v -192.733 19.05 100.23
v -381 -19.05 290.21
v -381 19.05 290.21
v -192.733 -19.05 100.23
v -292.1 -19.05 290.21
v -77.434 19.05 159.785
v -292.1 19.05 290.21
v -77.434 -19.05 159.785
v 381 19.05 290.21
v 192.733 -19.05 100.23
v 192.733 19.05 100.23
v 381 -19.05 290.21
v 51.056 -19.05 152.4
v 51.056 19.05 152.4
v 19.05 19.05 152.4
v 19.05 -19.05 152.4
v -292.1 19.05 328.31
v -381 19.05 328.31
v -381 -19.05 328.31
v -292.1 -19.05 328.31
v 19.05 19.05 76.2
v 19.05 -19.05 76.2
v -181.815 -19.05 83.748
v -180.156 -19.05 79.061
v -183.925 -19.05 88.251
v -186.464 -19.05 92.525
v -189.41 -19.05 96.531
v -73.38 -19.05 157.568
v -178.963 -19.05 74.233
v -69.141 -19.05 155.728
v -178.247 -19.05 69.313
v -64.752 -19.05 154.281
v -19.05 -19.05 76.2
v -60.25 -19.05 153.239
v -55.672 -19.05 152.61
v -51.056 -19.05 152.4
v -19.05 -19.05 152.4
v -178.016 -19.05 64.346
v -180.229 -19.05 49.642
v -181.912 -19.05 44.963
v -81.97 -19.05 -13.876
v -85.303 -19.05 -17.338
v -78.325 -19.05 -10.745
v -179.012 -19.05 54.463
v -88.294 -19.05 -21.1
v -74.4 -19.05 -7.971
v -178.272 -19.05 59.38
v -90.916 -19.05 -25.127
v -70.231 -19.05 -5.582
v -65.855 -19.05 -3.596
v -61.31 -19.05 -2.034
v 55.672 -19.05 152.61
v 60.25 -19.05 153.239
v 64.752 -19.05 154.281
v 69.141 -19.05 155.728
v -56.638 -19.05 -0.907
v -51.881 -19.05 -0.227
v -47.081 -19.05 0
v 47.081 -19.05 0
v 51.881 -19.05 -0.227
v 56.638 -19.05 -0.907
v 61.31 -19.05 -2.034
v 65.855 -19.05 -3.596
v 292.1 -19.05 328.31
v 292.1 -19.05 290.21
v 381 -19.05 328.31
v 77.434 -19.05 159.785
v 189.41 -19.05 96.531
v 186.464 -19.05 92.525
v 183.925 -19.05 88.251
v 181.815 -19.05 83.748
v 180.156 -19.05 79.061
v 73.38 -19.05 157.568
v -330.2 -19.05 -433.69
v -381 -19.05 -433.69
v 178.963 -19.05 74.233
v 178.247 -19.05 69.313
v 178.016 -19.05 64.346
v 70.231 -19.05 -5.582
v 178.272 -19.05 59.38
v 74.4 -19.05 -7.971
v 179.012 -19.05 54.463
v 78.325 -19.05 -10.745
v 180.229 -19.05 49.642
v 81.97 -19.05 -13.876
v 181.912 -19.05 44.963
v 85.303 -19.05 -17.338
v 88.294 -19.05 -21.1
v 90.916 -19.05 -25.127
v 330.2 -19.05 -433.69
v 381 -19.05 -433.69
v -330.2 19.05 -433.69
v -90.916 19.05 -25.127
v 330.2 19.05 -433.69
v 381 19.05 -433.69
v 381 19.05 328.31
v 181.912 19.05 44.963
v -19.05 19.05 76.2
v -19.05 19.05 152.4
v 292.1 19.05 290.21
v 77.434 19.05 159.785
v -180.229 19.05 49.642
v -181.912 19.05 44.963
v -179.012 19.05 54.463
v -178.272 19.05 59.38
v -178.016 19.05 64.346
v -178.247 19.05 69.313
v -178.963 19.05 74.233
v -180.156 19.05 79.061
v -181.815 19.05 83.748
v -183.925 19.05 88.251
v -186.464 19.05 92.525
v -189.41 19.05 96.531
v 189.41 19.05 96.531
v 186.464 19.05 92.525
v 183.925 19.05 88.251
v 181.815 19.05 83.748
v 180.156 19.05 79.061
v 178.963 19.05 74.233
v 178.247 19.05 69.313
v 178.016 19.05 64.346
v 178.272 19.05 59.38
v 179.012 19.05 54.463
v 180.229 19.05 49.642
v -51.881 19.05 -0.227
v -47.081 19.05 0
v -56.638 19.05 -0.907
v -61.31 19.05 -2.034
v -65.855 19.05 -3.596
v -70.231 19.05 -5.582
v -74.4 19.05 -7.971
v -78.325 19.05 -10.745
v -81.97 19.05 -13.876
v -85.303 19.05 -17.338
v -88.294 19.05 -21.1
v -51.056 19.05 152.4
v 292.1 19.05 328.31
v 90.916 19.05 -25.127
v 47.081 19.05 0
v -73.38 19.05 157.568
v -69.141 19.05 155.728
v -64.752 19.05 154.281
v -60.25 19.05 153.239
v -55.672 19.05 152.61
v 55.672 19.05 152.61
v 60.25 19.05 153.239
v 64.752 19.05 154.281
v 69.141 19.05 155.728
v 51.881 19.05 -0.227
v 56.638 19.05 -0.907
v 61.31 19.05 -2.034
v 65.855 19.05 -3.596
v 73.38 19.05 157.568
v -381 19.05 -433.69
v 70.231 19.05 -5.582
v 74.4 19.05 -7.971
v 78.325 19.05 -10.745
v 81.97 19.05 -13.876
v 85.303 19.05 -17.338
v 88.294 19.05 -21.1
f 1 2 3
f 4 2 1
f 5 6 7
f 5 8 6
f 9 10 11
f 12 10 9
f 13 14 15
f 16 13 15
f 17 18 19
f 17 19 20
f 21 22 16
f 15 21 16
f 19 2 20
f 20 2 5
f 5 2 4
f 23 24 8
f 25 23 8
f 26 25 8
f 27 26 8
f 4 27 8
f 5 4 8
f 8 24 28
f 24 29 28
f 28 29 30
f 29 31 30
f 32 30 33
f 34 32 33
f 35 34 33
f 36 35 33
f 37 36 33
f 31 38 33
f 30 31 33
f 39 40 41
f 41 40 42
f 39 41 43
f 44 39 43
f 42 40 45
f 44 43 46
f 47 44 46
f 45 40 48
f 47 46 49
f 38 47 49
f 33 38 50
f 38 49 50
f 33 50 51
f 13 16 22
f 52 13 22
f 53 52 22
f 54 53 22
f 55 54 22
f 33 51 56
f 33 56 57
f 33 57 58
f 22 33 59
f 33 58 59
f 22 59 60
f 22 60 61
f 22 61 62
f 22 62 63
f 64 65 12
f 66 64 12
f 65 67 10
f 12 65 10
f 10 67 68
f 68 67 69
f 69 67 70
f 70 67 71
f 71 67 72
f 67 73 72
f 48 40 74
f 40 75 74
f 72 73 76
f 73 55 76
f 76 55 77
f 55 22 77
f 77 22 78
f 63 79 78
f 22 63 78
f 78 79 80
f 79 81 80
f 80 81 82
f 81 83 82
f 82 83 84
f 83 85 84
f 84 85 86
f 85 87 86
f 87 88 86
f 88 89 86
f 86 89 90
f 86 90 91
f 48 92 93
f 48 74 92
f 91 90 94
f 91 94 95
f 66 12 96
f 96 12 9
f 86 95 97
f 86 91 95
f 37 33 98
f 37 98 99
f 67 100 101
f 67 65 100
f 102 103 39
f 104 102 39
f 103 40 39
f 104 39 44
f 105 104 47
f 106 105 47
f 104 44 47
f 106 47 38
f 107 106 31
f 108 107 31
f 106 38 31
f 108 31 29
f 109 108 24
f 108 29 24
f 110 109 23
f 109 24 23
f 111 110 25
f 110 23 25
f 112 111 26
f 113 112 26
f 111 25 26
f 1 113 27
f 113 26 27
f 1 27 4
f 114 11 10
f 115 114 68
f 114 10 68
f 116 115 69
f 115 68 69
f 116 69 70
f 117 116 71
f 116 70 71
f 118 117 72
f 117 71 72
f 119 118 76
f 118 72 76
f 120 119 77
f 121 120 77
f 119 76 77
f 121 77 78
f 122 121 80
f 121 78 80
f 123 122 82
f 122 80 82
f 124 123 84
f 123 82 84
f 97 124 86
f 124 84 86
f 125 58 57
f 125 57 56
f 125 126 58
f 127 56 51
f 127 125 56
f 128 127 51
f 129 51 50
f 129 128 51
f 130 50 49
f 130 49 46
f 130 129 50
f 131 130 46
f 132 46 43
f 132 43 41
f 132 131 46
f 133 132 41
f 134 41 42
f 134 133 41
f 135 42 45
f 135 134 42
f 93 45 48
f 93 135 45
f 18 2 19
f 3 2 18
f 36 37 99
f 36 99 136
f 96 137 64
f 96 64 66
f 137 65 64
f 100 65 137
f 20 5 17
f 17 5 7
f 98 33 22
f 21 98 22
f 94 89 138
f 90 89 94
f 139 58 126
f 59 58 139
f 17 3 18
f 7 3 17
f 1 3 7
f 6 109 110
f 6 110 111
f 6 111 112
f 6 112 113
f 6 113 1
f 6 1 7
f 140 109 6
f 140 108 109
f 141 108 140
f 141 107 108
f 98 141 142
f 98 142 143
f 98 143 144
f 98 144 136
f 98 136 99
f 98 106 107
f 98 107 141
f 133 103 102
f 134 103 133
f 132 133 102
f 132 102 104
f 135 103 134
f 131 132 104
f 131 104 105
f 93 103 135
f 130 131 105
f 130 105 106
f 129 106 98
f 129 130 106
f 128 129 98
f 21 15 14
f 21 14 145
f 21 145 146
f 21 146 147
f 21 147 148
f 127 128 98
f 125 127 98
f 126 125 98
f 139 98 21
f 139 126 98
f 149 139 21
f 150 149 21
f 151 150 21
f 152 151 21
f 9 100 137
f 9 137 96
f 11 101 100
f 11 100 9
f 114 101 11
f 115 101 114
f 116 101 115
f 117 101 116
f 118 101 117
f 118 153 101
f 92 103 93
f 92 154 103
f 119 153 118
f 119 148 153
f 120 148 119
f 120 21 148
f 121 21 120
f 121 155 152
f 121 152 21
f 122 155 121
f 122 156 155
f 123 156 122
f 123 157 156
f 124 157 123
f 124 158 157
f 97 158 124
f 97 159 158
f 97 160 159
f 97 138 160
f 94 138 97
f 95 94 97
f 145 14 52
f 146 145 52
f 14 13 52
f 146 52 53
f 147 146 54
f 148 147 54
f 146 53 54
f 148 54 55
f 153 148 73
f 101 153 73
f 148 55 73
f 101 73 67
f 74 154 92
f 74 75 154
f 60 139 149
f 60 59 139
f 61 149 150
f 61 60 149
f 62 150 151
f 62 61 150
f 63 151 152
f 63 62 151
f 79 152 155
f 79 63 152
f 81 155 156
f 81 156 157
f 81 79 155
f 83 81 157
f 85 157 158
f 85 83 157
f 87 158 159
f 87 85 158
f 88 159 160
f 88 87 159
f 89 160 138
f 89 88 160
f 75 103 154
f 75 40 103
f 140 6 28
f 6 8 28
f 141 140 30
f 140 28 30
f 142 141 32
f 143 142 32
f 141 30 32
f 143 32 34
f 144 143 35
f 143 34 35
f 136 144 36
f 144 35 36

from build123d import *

# Parameters (mm, degrees)
F1_DEPTH = 19.05
F2_R     = 50.8
F3_W     = 88.9
F3_H     = 38.1
F4_DEPTH = 38.1
F5_W     = 38.1
F5_H     = 76.2
F6_DEPTH = 38.101


with BuildPart() as f1:
    # F0 (on Front) → F1 (new body, symmetric)
    with BuildSketch(Plane.XZ):
        Polygon((-76.2, 0), (-19.05, 0), (19.05, 0), (76.2, 0), (330.2, -433.689813), (381, -433.689813), (168.919206, 76.2), (381, 290.210187), (292.1, 290.210187), (65.278791, 152.4), (0, 152.4), (-65.278791, 152.4), (-292.1, 290.210187), (-381, 290.210187), (-168.919206, 76.2), (-381, -433.689813), (-330.2, -433.689813), align=None)
    extrude(amount=F1_DEPTH, both=True)

    # F2
    f2_edges = [f1.edges().sort_by_distance(p)[0] for p in [
        (168.919206, 0, 76.2),
        (-65.278791, 0, 152.4),
        (65.278791, 0, 152.4),
        (-168.919206, 0, 76.2),
        (-76.2, 0, 0),
        (76.2, 0, 0),
    ]]
    fillet(f2_edges, radius=F2_R)

    # F3 (on face) → F4 (join)
    with BuildSketch(Plane.XY.offset(290.210187)):
        with Locations((-336.55, 0)):
            Rectangle(F3_W, F3_H)
        with Locations((336.55, 0)):
            Rectangle(F3_W, F3_H)
    extrude(amount=F4_DEPTH)

    # F5 (on face) → F6 (cut, through all)
    with BuildSketch(Plane.XZ.offset(19.05)):
        with Locations((0, 114.3)):
            Rectangle(F5_W, F5_H)
    extrude(amount=-F6_DEPTH, mode=Mode.SUBTRACT)


solid = f1.part
